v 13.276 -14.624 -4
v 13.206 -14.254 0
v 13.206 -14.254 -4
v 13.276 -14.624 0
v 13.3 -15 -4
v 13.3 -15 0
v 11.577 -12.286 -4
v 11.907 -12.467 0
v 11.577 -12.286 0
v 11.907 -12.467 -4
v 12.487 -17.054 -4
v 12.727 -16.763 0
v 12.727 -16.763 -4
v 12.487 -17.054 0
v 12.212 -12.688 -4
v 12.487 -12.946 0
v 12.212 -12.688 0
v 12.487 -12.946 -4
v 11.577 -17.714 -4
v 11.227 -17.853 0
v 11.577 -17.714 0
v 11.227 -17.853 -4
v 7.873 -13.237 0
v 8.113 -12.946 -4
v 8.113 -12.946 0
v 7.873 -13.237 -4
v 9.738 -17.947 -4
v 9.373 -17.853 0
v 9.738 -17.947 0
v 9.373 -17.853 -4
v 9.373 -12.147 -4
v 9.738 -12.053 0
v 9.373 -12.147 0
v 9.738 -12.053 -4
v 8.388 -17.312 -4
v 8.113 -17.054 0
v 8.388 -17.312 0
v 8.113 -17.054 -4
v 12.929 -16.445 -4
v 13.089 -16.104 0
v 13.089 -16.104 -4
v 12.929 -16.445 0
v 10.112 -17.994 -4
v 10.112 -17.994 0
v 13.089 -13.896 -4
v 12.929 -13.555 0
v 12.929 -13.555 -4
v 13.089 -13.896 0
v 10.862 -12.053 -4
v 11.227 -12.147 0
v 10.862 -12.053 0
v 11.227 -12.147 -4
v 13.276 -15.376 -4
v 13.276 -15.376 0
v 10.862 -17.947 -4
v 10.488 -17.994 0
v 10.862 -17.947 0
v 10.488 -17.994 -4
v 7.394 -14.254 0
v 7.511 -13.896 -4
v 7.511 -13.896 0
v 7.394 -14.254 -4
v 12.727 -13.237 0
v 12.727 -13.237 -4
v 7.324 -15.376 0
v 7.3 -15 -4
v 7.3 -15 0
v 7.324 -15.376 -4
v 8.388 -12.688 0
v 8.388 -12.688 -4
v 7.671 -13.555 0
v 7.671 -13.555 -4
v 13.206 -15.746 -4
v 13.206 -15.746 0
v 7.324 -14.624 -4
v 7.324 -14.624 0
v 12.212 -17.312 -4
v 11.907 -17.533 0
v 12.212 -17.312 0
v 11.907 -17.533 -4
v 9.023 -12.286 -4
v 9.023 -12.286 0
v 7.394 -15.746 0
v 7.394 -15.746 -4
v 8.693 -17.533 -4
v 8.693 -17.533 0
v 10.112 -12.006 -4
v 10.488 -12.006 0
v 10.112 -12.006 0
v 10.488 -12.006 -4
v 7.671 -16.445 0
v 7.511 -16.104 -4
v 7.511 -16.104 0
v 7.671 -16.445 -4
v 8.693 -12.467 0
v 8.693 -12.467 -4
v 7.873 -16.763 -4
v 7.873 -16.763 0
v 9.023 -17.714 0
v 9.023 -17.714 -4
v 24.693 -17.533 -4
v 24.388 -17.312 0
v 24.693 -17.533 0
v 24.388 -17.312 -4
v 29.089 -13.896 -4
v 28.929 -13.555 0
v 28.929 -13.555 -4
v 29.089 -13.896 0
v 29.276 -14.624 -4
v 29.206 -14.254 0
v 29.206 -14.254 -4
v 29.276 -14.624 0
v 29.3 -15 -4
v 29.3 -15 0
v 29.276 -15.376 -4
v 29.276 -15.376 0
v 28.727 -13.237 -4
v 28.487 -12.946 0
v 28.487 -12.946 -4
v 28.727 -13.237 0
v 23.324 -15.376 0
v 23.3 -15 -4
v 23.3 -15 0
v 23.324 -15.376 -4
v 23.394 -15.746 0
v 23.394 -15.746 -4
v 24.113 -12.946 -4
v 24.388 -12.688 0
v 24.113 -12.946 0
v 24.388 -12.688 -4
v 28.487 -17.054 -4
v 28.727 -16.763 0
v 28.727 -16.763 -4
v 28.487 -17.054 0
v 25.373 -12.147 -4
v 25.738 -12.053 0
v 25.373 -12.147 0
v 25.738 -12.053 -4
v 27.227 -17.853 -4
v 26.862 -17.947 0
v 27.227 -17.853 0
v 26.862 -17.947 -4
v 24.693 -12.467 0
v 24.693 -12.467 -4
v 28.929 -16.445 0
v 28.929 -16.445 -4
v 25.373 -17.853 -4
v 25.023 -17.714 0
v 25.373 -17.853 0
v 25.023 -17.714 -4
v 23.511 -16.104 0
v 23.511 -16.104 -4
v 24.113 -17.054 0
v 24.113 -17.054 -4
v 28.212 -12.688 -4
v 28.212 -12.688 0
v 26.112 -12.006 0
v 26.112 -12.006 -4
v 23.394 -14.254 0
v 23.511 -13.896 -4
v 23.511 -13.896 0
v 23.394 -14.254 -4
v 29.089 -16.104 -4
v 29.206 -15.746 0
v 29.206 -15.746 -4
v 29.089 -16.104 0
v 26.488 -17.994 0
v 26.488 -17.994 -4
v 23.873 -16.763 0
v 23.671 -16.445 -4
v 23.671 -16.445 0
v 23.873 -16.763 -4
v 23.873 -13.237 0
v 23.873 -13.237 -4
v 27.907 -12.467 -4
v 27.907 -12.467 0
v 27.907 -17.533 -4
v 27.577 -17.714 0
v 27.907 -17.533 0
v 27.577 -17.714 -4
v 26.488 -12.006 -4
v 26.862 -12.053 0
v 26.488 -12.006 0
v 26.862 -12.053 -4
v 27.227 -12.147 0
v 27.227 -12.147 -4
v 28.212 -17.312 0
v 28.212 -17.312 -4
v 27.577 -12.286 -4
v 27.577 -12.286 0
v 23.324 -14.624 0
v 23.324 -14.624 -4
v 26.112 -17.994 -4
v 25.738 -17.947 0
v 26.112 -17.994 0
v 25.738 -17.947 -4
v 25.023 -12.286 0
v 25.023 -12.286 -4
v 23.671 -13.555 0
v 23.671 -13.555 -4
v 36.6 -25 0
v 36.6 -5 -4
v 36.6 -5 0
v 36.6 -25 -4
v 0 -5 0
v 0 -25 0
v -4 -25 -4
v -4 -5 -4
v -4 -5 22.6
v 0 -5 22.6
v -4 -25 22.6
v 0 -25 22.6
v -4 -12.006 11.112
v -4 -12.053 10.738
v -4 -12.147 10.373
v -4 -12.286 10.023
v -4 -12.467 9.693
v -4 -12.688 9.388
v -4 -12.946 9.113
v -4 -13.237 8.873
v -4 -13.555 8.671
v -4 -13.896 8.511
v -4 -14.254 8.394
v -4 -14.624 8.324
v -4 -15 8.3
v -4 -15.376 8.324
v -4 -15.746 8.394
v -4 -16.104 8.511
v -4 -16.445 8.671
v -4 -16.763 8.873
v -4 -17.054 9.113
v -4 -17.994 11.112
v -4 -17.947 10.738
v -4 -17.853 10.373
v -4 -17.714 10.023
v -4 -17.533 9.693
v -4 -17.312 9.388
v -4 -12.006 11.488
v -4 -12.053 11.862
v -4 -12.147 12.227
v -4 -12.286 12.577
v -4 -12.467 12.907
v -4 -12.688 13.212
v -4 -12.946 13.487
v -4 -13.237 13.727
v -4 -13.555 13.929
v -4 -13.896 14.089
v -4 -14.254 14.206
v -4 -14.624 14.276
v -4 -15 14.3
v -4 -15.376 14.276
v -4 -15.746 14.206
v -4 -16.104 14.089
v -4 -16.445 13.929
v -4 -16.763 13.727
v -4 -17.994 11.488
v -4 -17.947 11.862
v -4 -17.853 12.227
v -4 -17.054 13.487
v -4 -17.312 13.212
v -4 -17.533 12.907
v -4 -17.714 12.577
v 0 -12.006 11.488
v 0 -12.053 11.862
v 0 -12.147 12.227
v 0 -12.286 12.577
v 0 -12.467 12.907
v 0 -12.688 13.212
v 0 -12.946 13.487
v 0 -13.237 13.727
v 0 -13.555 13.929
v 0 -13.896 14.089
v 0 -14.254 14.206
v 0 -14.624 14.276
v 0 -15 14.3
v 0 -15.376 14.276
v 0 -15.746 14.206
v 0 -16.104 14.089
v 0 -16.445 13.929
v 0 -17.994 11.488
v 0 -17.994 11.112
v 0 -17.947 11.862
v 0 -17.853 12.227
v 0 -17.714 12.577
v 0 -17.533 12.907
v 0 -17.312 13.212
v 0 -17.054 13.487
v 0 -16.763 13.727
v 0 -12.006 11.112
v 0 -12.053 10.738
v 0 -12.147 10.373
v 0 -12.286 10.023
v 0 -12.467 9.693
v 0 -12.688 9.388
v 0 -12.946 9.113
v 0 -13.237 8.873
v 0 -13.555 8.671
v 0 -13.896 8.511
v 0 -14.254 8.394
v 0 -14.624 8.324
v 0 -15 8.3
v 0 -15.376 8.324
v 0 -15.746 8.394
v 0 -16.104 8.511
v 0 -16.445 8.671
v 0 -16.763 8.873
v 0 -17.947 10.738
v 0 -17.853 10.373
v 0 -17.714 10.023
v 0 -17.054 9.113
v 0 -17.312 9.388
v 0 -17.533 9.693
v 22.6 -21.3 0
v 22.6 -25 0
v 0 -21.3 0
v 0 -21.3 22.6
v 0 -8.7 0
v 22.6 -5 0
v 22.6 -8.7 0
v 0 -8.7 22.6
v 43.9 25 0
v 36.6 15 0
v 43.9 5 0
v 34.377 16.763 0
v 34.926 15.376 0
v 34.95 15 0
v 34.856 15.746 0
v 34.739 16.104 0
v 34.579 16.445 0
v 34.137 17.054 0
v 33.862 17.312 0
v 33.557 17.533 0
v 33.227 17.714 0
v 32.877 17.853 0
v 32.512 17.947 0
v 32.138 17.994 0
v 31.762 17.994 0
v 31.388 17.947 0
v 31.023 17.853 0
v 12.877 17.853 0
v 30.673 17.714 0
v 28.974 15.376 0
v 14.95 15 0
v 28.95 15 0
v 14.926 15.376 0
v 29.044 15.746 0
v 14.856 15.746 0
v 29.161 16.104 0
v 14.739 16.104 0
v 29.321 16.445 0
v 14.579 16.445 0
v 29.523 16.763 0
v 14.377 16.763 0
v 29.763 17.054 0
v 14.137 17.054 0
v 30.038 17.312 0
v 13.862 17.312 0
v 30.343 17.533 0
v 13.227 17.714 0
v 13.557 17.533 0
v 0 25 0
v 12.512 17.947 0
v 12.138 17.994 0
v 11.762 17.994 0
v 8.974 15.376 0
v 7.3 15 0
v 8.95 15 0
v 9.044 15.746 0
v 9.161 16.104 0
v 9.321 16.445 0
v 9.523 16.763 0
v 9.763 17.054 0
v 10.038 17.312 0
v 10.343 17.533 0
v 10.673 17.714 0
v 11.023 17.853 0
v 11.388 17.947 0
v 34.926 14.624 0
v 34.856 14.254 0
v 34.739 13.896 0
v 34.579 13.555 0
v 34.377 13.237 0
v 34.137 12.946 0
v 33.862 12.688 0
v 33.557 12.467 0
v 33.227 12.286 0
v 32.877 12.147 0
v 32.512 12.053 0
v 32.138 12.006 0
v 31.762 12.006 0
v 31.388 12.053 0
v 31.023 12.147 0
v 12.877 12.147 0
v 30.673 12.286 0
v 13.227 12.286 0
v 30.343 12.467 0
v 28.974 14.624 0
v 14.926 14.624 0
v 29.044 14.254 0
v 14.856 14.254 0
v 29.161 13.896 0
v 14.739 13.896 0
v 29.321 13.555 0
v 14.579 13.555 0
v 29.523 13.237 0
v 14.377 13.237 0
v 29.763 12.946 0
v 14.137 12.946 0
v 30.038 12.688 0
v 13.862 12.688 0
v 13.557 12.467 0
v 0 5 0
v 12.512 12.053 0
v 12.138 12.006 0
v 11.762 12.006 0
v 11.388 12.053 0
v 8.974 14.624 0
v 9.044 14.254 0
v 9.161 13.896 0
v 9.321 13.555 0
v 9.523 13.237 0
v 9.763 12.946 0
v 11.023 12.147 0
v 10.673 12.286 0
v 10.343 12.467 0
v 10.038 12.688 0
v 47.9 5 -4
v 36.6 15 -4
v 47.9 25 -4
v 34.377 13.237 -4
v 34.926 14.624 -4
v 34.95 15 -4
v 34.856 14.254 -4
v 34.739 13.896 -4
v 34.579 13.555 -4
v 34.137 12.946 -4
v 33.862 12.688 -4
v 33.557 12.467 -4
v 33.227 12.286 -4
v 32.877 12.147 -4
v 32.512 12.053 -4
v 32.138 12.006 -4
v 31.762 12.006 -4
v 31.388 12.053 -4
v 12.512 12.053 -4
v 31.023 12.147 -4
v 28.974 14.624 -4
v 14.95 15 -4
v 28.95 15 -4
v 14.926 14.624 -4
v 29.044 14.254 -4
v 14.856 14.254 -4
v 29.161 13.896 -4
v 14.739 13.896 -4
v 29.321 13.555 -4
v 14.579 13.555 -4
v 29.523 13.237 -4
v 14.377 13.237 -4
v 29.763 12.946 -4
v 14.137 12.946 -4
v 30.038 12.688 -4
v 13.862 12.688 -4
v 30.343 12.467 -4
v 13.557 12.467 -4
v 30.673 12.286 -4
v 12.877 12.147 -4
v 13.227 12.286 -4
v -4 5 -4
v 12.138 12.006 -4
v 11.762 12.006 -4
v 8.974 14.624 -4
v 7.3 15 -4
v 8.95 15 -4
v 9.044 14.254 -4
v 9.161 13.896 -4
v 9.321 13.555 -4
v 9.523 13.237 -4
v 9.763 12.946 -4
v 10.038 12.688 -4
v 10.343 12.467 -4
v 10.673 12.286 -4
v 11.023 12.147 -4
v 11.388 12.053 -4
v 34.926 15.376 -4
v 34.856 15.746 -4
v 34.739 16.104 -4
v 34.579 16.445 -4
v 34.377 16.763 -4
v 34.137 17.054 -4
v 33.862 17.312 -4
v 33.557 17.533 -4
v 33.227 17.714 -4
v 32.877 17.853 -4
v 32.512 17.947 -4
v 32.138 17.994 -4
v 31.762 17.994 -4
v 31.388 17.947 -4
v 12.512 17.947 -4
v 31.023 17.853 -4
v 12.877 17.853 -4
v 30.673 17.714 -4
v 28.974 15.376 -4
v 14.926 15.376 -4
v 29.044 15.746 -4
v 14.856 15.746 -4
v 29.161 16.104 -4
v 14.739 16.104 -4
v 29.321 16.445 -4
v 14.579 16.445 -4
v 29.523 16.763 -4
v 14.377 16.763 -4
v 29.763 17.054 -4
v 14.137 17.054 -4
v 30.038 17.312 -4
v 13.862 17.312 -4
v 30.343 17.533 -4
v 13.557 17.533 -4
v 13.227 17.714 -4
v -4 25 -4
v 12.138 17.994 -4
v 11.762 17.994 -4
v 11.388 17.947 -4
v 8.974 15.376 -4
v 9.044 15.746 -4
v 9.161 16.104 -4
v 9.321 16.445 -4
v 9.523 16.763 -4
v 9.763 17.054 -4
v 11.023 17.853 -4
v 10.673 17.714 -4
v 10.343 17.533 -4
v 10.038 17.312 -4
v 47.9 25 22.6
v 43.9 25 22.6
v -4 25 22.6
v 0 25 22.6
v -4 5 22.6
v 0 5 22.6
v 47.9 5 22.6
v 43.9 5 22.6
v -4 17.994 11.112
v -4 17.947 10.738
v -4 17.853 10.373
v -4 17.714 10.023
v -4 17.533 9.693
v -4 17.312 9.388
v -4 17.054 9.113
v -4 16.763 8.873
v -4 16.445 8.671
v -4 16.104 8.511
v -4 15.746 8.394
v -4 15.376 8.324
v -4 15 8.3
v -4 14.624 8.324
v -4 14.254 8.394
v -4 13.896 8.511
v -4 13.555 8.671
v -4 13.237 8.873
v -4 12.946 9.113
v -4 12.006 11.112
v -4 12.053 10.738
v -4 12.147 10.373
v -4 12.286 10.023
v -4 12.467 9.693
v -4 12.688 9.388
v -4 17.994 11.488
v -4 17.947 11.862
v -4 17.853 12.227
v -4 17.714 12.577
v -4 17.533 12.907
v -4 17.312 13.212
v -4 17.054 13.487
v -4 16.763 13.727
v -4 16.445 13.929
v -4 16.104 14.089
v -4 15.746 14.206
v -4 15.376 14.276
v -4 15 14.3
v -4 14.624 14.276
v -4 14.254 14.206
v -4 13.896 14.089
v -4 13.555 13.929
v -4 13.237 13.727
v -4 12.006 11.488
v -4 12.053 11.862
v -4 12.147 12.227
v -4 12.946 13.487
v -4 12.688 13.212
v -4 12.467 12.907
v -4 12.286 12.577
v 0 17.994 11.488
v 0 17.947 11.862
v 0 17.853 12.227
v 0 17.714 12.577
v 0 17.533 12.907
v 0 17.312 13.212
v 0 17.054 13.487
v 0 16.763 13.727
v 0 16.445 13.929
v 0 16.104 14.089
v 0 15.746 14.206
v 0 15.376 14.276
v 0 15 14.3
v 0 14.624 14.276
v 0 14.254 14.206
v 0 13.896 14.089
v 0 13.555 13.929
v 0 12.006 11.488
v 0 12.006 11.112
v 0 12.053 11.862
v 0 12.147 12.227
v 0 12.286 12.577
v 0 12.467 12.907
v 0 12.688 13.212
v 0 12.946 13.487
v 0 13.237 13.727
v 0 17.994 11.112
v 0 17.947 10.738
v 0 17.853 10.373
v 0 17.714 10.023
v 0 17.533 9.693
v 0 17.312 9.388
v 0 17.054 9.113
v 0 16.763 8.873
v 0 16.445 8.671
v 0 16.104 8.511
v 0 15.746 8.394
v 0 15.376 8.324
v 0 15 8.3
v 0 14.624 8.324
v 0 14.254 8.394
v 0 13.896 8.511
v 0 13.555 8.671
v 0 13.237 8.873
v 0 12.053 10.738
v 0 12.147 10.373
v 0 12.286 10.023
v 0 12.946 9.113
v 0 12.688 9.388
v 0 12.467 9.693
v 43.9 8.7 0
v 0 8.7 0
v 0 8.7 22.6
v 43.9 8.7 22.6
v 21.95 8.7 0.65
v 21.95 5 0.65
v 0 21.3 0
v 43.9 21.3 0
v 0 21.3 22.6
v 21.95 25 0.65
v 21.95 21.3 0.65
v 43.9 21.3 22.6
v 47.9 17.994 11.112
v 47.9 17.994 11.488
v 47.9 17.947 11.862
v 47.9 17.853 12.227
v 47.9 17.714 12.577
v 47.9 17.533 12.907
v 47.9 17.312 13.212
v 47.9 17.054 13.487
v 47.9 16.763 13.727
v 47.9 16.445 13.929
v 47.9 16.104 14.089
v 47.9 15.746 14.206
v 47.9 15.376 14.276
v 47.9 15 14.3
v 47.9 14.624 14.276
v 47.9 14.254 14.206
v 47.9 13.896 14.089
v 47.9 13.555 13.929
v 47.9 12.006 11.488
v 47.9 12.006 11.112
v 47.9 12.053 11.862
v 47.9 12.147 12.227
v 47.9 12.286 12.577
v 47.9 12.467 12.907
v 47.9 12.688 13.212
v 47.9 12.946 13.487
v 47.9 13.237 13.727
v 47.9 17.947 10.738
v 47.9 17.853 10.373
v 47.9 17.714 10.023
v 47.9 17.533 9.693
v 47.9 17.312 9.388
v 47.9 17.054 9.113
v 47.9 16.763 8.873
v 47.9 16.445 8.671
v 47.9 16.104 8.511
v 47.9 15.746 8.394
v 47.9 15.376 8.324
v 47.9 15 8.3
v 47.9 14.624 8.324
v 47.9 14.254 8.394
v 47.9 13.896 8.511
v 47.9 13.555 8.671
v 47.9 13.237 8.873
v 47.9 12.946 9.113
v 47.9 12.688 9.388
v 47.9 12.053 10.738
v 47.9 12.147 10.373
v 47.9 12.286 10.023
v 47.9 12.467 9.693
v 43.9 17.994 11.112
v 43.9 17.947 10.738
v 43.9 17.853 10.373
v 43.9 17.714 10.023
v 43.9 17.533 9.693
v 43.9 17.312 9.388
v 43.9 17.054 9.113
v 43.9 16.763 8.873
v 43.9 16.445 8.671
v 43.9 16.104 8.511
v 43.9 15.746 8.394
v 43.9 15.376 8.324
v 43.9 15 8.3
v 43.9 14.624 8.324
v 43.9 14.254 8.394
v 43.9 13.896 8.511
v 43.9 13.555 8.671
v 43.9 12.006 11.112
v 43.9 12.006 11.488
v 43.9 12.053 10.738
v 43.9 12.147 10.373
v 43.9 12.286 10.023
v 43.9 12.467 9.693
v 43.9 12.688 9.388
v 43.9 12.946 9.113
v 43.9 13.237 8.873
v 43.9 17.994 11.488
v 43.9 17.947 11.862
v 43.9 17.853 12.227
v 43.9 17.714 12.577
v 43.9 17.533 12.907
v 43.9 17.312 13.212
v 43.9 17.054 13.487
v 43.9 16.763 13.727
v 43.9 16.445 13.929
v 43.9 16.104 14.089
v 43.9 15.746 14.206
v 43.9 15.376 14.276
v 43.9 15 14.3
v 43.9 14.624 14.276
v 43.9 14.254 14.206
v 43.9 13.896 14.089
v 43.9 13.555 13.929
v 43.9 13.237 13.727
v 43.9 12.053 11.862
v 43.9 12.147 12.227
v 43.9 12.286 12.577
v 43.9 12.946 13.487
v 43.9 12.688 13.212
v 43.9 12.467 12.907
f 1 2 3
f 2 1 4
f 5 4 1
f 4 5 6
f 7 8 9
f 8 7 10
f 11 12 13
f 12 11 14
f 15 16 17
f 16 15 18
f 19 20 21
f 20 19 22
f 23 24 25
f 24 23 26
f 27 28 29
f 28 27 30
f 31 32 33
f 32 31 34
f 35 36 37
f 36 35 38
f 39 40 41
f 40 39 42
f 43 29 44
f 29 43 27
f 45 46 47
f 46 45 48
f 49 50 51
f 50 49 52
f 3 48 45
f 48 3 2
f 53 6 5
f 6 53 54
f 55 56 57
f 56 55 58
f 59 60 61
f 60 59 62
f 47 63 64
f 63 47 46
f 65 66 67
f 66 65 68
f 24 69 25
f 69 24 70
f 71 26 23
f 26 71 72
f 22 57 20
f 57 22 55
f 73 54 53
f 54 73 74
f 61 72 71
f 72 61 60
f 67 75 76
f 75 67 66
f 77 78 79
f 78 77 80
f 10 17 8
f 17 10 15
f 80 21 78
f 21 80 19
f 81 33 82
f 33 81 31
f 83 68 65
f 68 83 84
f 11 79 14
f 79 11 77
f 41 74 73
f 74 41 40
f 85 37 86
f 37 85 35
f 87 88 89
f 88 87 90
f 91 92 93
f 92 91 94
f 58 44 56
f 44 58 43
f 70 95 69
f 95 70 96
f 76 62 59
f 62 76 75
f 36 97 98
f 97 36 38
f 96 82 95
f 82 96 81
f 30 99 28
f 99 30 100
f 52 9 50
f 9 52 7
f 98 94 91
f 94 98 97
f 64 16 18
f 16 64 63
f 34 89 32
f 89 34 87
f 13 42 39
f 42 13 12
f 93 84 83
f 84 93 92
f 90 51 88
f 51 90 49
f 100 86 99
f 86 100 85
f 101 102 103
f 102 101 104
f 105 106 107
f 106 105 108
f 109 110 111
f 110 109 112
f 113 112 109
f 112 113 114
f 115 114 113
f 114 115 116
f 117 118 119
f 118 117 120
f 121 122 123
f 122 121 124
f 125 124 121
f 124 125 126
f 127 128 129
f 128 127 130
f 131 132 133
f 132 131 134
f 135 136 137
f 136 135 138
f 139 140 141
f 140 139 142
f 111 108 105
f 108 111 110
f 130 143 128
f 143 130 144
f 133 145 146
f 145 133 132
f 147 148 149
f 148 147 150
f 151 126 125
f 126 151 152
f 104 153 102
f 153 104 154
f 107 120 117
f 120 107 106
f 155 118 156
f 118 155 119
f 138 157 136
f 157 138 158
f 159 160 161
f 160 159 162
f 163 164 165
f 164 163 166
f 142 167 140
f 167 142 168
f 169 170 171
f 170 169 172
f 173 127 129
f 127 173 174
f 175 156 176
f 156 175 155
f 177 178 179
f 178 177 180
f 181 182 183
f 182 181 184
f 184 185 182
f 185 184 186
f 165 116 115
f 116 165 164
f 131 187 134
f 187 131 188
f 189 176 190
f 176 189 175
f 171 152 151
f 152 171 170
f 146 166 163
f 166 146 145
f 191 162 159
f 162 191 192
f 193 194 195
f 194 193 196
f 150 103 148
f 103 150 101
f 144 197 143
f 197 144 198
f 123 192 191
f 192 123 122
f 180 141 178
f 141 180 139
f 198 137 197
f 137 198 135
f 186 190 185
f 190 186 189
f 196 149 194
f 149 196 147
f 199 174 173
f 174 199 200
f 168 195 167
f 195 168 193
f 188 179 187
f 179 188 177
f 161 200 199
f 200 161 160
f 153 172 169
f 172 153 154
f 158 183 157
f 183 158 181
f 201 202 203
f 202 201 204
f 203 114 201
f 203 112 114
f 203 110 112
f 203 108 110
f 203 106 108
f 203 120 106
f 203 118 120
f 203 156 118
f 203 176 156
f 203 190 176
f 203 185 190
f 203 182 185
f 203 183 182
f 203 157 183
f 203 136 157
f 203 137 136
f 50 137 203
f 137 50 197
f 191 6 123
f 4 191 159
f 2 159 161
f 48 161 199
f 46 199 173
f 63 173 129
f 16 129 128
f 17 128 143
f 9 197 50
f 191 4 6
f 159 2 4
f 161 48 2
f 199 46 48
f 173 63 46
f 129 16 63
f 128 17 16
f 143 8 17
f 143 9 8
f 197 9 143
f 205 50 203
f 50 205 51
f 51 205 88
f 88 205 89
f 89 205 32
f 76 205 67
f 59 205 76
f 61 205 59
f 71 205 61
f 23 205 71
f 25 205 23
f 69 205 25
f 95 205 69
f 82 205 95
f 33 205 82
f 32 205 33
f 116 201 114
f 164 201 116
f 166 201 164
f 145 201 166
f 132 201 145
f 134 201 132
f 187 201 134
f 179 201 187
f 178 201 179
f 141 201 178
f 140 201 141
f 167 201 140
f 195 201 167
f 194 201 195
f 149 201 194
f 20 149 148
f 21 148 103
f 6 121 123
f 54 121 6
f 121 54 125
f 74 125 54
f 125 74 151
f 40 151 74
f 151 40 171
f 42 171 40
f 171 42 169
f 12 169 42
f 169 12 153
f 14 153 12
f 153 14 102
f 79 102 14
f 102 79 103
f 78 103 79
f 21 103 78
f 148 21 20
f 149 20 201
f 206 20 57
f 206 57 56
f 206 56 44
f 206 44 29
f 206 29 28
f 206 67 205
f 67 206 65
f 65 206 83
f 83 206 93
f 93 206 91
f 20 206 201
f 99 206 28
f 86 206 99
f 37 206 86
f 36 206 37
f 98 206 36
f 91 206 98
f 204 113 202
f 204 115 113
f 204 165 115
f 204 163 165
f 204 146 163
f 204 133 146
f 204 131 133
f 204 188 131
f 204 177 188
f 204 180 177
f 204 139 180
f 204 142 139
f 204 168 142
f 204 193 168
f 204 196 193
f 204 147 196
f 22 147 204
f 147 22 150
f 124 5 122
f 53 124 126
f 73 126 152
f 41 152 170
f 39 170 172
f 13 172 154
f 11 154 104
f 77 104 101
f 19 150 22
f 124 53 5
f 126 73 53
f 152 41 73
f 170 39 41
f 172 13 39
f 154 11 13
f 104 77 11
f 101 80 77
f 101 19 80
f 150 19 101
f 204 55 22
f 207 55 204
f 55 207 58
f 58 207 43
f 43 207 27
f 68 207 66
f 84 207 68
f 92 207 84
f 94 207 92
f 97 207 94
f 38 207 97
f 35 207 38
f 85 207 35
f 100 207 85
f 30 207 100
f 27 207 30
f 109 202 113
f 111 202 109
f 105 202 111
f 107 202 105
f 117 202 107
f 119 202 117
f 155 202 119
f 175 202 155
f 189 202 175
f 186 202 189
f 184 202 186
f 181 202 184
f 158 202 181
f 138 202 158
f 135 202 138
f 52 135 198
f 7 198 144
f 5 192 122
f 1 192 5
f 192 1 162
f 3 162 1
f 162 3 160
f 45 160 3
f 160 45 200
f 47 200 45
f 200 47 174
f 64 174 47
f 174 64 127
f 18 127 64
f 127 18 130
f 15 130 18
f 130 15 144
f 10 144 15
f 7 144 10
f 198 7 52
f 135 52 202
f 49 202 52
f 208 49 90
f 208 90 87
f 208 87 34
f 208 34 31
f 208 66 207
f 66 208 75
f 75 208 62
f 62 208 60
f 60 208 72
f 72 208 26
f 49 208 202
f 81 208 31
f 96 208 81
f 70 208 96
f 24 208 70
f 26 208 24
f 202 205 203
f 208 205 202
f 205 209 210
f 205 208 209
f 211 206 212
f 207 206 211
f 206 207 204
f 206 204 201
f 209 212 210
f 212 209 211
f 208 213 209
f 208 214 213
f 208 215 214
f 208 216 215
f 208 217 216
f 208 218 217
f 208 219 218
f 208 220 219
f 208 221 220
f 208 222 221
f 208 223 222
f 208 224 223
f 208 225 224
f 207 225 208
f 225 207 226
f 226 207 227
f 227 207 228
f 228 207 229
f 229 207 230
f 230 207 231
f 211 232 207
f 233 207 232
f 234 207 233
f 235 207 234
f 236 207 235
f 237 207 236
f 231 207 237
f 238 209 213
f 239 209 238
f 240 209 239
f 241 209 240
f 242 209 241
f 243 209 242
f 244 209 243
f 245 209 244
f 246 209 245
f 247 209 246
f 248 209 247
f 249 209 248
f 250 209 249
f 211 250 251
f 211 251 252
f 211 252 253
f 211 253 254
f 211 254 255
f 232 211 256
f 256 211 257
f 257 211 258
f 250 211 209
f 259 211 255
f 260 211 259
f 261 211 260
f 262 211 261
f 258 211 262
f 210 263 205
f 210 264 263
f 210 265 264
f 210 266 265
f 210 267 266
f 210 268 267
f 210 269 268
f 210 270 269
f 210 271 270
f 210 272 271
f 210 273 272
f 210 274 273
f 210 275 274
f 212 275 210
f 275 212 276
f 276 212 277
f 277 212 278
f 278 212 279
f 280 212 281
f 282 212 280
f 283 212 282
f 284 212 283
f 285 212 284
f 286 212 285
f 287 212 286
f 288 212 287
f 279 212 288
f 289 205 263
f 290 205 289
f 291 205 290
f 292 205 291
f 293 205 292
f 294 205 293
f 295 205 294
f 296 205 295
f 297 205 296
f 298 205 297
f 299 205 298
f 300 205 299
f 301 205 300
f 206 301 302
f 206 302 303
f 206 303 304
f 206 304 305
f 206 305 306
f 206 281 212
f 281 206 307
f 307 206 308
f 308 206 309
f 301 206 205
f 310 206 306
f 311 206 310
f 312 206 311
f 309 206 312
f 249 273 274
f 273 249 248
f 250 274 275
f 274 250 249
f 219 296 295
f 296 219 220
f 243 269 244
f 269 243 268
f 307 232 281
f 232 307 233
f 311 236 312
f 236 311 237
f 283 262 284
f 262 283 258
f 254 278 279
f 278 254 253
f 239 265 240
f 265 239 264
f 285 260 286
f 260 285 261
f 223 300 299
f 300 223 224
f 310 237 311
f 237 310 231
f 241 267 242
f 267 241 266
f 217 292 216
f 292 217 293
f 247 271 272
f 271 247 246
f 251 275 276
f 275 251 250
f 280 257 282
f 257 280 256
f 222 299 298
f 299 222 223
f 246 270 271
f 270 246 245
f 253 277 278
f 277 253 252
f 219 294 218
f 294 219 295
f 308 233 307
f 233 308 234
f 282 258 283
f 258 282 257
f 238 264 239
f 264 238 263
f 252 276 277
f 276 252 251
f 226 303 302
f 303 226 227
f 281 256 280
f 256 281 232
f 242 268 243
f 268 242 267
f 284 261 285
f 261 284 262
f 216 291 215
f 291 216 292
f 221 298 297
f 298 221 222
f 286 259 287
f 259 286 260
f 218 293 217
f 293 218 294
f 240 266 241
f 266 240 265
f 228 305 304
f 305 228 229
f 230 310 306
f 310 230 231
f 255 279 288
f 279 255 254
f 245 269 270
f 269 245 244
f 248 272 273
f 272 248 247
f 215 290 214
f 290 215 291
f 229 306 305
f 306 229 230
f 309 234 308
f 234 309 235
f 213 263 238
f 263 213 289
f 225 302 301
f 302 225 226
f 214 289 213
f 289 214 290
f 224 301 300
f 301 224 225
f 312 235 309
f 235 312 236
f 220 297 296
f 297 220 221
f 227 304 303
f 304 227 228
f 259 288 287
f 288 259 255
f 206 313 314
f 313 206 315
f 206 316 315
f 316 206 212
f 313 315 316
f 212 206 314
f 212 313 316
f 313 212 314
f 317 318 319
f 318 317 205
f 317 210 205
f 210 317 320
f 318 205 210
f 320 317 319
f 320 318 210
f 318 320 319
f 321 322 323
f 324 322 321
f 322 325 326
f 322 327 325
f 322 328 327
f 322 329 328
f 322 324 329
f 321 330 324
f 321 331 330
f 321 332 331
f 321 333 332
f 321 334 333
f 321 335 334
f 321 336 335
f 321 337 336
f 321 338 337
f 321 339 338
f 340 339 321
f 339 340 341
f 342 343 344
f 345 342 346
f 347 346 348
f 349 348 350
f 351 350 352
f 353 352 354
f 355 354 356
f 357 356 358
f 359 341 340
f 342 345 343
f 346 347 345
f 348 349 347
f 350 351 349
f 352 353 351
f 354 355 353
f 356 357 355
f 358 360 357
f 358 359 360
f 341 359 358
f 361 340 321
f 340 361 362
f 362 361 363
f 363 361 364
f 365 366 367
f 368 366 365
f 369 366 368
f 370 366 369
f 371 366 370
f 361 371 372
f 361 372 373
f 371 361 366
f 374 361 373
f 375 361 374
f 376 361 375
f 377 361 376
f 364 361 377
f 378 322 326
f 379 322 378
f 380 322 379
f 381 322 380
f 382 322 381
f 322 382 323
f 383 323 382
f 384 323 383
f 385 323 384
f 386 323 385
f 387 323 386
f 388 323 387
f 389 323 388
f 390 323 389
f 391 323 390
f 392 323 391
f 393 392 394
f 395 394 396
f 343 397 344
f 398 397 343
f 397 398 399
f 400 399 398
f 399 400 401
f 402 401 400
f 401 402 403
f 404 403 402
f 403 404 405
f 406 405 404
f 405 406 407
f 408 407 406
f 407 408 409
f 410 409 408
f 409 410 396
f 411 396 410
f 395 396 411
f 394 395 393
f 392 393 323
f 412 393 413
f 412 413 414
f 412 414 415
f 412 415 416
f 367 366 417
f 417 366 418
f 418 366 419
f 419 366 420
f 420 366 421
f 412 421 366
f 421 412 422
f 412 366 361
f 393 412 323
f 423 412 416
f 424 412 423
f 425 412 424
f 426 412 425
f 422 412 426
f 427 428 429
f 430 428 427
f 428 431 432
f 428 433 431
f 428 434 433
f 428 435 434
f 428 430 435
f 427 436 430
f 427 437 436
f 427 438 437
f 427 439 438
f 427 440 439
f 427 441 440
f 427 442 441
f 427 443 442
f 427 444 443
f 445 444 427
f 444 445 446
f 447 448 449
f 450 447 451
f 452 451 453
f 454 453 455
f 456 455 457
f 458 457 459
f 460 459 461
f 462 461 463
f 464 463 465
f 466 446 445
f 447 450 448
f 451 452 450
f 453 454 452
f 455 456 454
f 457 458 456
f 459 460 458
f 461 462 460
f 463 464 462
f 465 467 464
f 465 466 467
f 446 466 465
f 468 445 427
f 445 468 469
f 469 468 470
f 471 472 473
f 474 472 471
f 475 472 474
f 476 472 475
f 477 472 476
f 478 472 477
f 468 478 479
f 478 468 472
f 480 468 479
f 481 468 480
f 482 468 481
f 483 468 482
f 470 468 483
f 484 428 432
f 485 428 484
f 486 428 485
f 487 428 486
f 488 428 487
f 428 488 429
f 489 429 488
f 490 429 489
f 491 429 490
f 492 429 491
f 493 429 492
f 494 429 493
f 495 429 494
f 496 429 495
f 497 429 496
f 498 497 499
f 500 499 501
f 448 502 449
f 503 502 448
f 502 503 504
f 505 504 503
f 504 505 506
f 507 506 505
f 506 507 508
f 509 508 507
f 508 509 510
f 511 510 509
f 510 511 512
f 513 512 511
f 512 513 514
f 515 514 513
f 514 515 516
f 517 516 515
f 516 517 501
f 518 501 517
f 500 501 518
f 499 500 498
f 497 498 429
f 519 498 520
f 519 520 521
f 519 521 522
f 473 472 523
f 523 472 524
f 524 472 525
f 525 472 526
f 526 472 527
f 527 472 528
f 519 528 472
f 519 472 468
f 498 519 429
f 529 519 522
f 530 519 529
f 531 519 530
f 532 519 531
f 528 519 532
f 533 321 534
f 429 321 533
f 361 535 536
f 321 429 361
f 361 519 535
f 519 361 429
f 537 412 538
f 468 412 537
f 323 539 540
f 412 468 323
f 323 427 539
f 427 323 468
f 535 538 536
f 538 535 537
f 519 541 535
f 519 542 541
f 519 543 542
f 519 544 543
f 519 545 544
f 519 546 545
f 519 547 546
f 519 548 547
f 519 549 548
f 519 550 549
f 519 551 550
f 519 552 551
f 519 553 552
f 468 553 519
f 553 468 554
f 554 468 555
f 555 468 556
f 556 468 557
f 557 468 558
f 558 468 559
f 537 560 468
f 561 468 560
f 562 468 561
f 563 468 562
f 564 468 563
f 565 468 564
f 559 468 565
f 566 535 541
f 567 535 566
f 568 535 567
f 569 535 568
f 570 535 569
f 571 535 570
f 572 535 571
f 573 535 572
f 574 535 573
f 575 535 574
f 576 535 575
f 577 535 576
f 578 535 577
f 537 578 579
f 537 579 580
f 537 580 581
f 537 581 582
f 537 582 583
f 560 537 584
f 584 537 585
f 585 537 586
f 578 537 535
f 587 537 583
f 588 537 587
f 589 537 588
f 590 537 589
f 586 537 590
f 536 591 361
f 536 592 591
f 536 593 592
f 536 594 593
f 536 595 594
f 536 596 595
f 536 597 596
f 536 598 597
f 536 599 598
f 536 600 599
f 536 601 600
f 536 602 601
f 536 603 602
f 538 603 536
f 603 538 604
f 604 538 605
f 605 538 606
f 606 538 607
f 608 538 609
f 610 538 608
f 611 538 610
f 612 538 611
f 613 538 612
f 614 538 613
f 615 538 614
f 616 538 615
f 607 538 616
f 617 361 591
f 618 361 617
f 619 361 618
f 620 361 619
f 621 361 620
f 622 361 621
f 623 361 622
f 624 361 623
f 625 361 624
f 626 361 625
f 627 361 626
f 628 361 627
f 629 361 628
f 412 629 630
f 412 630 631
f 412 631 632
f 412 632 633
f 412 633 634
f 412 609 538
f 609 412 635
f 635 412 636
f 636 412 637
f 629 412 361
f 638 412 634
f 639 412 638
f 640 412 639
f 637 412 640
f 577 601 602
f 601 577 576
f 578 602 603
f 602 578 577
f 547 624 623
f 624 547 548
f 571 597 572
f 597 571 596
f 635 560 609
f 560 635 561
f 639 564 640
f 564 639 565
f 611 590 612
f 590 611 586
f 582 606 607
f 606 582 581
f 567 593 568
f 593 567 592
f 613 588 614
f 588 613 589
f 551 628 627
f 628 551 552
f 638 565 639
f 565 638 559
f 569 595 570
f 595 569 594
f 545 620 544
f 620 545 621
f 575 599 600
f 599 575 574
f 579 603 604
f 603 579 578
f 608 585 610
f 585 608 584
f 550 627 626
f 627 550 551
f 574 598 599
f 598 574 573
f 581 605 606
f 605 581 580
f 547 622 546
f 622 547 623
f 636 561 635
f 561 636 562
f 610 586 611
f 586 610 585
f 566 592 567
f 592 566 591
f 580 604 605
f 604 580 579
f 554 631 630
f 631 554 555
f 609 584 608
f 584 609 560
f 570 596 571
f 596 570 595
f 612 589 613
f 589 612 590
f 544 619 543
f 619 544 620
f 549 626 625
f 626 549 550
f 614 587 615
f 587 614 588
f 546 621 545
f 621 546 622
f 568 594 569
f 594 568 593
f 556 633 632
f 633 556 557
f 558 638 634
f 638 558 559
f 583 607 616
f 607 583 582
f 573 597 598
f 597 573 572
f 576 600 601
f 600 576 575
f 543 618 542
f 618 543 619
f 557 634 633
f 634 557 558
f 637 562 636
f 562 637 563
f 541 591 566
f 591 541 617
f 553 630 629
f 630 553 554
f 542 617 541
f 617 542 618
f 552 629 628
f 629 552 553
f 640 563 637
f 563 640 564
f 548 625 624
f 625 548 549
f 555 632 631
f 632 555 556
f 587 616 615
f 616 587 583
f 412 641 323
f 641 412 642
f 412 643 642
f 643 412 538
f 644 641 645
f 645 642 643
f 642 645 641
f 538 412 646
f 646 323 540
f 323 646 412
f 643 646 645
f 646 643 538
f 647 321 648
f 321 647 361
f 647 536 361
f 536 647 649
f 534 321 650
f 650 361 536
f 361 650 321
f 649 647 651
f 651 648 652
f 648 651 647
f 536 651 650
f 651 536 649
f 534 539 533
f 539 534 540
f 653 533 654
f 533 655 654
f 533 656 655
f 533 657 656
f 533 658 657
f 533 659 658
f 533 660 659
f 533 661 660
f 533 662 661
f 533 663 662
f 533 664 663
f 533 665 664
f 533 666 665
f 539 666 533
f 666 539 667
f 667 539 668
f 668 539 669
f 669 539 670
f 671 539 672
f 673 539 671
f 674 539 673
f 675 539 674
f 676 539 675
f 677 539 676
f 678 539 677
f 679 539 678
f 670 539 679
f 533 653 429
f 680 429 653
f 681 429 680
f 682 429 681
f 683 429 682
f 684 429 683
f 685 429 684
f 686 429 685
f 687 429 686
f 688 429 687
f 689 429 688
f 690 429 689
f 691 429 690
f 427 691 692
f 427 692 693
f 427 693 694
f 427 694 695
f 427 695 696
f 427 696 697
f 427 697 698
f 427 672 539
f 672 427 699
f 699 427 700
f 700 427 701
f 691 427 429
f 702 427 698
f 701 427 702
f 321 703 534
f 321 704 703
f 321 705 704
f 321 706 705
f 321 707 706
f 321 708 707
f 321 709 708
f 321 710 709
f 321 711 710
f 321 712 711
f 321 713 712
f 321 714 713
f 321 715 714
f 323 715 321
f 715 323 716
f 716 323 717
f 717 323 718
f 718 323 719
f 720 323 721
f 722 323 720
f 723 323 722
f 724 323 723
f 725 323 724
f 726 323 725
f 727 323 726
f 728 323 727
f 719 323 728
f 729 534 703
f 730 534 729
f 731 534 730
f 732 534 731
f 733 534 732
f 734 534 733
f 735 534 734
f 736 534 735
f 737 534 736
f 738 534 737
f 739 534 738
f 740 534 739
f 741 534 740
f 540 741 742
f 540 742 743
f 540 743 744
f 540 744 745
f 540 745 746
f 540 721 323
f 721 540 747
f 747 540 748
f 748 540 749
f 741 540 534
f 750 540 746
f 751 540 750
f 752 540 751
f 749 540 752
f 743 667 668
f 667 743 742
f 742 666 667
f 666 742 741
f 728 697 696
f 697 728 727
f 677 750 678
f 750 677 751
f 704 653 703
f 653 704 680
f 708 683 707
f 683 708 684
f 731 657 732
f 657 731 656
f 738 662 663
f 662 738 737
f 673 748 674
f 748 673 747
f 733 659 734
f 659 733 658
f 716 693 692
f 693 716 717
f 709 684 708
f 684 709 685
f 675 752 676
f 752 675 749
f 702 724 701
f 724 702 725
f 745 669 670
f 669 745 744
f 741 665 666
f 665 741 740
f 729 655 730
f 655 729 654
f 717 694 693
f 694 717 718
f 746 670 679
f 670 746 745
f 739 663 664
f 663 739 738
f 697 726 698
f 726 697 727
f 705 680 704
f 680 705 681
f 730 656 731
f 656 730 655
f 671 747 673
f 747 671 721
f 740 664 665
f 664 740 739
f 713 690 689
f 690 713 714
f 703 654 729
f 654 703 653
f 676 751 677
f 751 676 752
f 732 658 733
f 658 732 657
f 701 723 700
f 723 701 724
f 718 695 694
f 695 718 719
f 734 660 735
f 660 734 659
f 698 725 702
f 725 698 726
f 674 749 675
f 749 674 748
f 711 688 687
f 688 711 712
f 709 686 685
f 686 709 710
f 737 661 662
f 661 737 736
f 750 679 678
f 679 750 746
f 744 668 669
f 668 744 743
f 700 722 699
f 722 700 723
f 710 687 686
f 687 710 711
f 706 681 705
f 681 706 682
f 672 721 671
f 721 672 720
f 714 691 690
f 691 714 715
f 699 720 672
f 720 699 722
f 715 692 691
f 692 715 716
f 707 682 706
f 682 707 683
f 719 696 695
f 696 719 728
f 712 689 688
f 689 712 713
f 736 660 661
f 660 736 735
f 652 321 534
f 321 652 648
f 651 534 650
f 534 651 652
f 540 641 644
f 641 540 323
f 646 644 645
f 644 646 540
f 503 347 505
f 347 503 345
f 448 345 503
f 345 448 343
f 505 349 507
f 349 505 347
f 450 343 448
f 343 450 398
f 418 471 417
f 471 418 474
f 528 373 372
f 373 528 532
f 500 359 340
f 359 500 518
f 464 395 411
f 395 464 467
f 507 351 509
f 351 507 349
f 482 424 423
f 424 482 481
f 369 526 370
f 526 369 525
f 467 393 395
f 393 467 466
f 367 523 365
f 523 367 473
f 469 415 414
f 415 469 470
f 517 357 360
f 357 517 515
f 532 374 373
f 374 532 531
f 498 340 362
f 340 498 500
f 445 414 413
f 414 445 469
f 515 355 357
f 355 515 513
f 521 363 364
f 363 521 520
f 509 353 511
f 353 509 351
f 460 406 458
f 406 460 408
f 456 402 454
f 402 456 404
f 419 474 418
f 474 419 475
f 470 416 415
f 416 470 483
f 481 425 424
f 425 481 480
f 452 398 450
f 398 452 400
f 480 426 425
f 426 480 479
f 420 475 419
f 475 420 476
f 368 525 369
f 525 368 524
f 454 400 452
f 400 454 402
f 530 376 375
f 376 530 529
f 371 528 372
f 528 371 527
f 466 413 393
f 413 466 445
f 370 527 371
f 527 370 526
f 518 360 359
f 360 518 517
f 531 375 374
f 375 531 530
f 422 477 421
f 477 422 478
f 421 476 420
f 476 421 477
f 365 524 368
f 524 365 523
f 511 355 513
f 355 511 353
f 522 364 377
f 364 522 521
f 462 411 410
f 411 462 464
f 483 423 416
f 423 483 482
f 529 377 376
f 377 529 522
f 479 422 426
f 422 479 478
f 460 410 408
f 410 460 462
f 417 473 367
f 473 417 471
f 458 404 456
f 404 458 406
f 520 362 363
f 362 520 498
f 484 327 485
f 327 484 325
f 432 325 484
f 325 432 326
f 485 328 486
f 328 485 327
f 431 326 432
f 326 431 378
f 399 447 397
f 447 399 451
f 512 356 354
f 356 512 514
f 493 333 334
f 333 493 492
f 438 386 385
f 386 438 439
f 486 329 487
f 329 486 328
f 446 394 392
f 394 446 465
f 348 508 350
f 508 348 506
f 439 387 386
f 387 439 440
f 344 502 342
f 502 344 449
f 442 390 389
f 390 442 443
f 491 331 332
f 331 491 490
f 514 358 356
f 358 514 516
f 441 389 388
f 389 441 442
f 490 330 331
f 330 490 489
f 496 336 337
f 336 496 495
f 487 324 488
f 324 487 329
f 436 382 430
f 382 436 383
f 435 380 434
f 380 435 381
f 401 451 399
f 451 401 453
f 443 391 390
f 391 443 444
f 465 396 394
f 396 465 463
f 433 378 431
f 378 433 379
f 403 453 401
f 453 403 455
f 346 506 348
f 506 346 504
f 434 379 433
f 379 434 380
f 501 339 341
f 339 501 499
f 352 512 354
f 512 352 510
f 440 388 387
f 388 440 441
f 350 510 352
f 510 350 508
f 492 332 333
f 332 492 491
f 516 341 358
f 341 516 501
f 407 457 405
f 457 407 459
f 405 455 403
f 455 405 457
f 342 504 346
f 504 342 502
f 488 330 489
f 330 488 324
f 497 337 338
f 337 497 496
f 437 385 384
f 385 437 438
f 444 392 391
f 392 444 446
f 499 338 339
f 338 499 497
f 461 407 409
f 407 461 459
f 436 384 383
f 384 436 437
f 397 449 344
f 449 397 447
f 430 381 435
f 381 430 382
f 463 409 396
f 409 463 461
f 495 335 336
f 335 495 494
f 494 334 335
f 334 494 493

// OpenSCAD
$fn = 50;

capheight = 6;
capdiam = 8.6;

requiredspace = capdiam + 4;

m5rad = 3;

extralengthh = 14;
extralengthv = 0;

lengthh = capheight*2 + capdiam + 2 + extralengthh;
lengthv = capheight*2 + capdiam + 2 + extralengthv;
dim = 20;

holesv = [0];
holesh = [-8, 8];

wall = 4;

translate([0, -15, ])
	corner();

translate([0, 15, ])
	doublecorner();

module doublecorner() {
	difference() {
		union() {
			corner();
			translate([51.9-wall*2, 0, 0]) rotate([0, 0, 180]) corner();
		}
		for (i=[-1, 1])
			translate([(51.9-wall*2)/2+i*10, 0, 0])
				cylinder(r=m5rad, h=10, center=true);
	}
}


module corner() {
	union() {
		tab(lengthh, holesh);
		rotate([0, -90, 0])
			translate([0, 0, wall])
				tab(lengthv, holesv);
		for (i=[-1, 1])
			translate([0, i*(dim/2-min(wall, (dim-requiredspace)/2)/2), 0])
				wing(min(lengthh, lengthv));
	}
}

module tab(llen, hl) {
	translate([llen/2, 0, -wall/2])
	union() {
		difference() {
			cube([llen, dim, wall], true);
			for (i=hl)
				translate([i, 0, 0])
					cylinder(r=m5rad, h=wall*2, center=true);
		}
		translate([-llen/2-wall/2, 0, 0])
			cube([wall, dim, wall], true);
	}
}

module wing(llen) {
	translate([llen/2, 0, llen/2])
	difference() {
		cube([llen, min(wall, (dim-requiredspace)/2), llen], true);
		rotate([0, -45, 0])
			translate([llen/2, 0, 0])
				cube([llen, wall+1, llen*2], true);
	}
}
